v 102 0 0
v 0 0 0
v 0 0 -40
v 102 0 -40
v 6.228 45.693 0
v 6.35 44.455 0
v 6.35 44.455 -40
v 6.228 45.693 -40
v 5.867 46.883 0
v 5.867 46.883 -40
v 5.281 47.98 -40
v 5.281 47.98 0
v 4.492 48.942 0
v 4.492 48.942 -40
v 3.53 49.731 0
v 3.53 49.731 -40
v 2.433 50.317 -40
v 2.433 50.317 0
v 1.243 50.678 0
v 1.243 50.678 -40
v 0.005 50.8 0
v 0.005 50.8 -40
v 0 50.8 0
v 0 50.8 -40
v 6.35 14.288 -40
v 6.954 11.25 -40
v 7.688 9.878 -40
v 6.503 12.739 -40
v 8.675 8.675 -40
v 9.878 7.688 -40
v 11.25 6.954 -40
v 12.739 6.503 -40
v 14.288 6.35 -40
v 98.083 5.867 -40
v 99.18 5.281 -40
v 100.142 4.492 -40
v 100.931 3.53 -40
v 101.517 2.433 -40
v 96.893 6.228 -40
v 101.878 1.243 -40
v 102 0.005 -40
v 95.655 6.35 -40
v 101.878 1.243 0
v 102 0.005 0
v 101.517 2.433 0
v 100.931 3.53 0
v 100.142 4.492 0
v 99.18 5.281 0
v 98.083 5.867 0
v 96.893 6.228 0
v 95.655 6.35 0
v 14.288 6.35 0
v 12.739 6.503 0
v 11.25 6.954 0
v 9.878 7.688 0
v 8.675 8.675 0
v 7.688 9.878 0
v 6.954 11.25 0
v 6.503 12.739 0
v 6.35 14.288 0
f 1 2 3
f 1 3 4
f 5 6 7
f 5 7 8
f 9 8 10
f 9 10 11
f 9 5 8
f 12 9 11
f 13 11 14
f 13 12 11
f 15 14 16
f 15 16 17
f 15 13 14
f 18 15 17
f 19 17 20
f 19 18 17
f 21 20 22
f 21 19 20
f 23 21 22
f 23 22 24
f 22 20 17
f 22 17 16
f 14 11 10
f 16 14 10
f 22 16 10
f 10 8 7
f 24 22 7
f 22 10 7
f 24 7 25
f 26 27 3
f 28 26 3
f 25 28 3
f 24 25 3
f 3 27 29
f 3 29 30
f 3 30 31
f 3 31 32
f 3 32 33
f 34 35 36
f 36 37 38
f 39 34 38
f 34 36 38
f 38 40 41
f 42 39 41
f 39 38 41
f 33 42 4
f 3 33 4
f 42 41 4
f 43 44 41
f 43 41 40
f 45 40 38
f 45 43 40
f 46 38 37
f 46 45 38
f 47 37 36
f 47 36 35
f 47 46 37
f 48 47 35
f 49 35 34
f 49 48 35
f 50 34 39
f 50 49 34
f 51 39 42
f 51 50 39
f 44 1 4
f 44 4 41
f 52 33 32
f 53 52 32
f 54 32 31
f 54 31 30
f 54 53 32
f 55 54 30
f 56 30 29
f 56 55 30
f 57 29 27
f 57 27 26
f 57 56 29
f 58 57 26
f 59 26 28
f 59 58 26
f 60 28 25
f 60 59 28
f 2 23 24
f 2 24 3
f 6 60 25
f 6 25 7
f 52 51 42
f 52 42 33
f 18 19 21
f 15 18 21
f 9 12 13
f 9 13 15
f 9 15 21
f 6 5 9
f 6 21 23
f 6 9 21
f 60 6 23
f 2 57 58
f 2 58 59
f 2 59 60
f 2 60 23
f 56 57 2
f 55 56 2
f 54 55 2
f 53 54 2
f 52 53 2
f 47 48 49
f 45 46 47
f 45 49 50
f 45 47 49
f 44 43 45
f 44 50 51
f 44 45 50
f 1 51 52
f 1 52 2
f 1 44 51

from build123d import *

# Parameters (mm, degrees)
HIERRO_ANGULAR_3_X_2_X_0_25_1_DEPTH = 40


with BuildPart() as part:
    # Sketch1 → Hierro angular 3 X 2 X 0.25(1) (new body)
    with BuildSketch(Plane.YX):
        with BuildLine():
            Line((0, 0), (0, 102))
            Line((0, 102), (0.00508, 102))
            ThreePointArc((0.00508, 102), (4.491615958, 100.141615958), (6.35, 95.65508))
            Line((6.35, 95.65508), (6.35, 14.2875))
            ThreePointArc((6.35, 14.2875), (8.674839924, 8.674839924), (14.2875, 6.35))
            Line((14.2875, 6.35), (44.45508, 6.35))
            ThreePointArc((44.45508, 6.35), (48.941615958, 4.491615958), (50.8, 0.00508))
            Line((50.8, 0.00508), (50.8, 0))
            Line((50.8, 0), (0, 0))
        make_face()
    extrude(amount=HIERRO_ANGULAR_3_X_2_X_0_25_1_DEPTH)


solid = part.part
